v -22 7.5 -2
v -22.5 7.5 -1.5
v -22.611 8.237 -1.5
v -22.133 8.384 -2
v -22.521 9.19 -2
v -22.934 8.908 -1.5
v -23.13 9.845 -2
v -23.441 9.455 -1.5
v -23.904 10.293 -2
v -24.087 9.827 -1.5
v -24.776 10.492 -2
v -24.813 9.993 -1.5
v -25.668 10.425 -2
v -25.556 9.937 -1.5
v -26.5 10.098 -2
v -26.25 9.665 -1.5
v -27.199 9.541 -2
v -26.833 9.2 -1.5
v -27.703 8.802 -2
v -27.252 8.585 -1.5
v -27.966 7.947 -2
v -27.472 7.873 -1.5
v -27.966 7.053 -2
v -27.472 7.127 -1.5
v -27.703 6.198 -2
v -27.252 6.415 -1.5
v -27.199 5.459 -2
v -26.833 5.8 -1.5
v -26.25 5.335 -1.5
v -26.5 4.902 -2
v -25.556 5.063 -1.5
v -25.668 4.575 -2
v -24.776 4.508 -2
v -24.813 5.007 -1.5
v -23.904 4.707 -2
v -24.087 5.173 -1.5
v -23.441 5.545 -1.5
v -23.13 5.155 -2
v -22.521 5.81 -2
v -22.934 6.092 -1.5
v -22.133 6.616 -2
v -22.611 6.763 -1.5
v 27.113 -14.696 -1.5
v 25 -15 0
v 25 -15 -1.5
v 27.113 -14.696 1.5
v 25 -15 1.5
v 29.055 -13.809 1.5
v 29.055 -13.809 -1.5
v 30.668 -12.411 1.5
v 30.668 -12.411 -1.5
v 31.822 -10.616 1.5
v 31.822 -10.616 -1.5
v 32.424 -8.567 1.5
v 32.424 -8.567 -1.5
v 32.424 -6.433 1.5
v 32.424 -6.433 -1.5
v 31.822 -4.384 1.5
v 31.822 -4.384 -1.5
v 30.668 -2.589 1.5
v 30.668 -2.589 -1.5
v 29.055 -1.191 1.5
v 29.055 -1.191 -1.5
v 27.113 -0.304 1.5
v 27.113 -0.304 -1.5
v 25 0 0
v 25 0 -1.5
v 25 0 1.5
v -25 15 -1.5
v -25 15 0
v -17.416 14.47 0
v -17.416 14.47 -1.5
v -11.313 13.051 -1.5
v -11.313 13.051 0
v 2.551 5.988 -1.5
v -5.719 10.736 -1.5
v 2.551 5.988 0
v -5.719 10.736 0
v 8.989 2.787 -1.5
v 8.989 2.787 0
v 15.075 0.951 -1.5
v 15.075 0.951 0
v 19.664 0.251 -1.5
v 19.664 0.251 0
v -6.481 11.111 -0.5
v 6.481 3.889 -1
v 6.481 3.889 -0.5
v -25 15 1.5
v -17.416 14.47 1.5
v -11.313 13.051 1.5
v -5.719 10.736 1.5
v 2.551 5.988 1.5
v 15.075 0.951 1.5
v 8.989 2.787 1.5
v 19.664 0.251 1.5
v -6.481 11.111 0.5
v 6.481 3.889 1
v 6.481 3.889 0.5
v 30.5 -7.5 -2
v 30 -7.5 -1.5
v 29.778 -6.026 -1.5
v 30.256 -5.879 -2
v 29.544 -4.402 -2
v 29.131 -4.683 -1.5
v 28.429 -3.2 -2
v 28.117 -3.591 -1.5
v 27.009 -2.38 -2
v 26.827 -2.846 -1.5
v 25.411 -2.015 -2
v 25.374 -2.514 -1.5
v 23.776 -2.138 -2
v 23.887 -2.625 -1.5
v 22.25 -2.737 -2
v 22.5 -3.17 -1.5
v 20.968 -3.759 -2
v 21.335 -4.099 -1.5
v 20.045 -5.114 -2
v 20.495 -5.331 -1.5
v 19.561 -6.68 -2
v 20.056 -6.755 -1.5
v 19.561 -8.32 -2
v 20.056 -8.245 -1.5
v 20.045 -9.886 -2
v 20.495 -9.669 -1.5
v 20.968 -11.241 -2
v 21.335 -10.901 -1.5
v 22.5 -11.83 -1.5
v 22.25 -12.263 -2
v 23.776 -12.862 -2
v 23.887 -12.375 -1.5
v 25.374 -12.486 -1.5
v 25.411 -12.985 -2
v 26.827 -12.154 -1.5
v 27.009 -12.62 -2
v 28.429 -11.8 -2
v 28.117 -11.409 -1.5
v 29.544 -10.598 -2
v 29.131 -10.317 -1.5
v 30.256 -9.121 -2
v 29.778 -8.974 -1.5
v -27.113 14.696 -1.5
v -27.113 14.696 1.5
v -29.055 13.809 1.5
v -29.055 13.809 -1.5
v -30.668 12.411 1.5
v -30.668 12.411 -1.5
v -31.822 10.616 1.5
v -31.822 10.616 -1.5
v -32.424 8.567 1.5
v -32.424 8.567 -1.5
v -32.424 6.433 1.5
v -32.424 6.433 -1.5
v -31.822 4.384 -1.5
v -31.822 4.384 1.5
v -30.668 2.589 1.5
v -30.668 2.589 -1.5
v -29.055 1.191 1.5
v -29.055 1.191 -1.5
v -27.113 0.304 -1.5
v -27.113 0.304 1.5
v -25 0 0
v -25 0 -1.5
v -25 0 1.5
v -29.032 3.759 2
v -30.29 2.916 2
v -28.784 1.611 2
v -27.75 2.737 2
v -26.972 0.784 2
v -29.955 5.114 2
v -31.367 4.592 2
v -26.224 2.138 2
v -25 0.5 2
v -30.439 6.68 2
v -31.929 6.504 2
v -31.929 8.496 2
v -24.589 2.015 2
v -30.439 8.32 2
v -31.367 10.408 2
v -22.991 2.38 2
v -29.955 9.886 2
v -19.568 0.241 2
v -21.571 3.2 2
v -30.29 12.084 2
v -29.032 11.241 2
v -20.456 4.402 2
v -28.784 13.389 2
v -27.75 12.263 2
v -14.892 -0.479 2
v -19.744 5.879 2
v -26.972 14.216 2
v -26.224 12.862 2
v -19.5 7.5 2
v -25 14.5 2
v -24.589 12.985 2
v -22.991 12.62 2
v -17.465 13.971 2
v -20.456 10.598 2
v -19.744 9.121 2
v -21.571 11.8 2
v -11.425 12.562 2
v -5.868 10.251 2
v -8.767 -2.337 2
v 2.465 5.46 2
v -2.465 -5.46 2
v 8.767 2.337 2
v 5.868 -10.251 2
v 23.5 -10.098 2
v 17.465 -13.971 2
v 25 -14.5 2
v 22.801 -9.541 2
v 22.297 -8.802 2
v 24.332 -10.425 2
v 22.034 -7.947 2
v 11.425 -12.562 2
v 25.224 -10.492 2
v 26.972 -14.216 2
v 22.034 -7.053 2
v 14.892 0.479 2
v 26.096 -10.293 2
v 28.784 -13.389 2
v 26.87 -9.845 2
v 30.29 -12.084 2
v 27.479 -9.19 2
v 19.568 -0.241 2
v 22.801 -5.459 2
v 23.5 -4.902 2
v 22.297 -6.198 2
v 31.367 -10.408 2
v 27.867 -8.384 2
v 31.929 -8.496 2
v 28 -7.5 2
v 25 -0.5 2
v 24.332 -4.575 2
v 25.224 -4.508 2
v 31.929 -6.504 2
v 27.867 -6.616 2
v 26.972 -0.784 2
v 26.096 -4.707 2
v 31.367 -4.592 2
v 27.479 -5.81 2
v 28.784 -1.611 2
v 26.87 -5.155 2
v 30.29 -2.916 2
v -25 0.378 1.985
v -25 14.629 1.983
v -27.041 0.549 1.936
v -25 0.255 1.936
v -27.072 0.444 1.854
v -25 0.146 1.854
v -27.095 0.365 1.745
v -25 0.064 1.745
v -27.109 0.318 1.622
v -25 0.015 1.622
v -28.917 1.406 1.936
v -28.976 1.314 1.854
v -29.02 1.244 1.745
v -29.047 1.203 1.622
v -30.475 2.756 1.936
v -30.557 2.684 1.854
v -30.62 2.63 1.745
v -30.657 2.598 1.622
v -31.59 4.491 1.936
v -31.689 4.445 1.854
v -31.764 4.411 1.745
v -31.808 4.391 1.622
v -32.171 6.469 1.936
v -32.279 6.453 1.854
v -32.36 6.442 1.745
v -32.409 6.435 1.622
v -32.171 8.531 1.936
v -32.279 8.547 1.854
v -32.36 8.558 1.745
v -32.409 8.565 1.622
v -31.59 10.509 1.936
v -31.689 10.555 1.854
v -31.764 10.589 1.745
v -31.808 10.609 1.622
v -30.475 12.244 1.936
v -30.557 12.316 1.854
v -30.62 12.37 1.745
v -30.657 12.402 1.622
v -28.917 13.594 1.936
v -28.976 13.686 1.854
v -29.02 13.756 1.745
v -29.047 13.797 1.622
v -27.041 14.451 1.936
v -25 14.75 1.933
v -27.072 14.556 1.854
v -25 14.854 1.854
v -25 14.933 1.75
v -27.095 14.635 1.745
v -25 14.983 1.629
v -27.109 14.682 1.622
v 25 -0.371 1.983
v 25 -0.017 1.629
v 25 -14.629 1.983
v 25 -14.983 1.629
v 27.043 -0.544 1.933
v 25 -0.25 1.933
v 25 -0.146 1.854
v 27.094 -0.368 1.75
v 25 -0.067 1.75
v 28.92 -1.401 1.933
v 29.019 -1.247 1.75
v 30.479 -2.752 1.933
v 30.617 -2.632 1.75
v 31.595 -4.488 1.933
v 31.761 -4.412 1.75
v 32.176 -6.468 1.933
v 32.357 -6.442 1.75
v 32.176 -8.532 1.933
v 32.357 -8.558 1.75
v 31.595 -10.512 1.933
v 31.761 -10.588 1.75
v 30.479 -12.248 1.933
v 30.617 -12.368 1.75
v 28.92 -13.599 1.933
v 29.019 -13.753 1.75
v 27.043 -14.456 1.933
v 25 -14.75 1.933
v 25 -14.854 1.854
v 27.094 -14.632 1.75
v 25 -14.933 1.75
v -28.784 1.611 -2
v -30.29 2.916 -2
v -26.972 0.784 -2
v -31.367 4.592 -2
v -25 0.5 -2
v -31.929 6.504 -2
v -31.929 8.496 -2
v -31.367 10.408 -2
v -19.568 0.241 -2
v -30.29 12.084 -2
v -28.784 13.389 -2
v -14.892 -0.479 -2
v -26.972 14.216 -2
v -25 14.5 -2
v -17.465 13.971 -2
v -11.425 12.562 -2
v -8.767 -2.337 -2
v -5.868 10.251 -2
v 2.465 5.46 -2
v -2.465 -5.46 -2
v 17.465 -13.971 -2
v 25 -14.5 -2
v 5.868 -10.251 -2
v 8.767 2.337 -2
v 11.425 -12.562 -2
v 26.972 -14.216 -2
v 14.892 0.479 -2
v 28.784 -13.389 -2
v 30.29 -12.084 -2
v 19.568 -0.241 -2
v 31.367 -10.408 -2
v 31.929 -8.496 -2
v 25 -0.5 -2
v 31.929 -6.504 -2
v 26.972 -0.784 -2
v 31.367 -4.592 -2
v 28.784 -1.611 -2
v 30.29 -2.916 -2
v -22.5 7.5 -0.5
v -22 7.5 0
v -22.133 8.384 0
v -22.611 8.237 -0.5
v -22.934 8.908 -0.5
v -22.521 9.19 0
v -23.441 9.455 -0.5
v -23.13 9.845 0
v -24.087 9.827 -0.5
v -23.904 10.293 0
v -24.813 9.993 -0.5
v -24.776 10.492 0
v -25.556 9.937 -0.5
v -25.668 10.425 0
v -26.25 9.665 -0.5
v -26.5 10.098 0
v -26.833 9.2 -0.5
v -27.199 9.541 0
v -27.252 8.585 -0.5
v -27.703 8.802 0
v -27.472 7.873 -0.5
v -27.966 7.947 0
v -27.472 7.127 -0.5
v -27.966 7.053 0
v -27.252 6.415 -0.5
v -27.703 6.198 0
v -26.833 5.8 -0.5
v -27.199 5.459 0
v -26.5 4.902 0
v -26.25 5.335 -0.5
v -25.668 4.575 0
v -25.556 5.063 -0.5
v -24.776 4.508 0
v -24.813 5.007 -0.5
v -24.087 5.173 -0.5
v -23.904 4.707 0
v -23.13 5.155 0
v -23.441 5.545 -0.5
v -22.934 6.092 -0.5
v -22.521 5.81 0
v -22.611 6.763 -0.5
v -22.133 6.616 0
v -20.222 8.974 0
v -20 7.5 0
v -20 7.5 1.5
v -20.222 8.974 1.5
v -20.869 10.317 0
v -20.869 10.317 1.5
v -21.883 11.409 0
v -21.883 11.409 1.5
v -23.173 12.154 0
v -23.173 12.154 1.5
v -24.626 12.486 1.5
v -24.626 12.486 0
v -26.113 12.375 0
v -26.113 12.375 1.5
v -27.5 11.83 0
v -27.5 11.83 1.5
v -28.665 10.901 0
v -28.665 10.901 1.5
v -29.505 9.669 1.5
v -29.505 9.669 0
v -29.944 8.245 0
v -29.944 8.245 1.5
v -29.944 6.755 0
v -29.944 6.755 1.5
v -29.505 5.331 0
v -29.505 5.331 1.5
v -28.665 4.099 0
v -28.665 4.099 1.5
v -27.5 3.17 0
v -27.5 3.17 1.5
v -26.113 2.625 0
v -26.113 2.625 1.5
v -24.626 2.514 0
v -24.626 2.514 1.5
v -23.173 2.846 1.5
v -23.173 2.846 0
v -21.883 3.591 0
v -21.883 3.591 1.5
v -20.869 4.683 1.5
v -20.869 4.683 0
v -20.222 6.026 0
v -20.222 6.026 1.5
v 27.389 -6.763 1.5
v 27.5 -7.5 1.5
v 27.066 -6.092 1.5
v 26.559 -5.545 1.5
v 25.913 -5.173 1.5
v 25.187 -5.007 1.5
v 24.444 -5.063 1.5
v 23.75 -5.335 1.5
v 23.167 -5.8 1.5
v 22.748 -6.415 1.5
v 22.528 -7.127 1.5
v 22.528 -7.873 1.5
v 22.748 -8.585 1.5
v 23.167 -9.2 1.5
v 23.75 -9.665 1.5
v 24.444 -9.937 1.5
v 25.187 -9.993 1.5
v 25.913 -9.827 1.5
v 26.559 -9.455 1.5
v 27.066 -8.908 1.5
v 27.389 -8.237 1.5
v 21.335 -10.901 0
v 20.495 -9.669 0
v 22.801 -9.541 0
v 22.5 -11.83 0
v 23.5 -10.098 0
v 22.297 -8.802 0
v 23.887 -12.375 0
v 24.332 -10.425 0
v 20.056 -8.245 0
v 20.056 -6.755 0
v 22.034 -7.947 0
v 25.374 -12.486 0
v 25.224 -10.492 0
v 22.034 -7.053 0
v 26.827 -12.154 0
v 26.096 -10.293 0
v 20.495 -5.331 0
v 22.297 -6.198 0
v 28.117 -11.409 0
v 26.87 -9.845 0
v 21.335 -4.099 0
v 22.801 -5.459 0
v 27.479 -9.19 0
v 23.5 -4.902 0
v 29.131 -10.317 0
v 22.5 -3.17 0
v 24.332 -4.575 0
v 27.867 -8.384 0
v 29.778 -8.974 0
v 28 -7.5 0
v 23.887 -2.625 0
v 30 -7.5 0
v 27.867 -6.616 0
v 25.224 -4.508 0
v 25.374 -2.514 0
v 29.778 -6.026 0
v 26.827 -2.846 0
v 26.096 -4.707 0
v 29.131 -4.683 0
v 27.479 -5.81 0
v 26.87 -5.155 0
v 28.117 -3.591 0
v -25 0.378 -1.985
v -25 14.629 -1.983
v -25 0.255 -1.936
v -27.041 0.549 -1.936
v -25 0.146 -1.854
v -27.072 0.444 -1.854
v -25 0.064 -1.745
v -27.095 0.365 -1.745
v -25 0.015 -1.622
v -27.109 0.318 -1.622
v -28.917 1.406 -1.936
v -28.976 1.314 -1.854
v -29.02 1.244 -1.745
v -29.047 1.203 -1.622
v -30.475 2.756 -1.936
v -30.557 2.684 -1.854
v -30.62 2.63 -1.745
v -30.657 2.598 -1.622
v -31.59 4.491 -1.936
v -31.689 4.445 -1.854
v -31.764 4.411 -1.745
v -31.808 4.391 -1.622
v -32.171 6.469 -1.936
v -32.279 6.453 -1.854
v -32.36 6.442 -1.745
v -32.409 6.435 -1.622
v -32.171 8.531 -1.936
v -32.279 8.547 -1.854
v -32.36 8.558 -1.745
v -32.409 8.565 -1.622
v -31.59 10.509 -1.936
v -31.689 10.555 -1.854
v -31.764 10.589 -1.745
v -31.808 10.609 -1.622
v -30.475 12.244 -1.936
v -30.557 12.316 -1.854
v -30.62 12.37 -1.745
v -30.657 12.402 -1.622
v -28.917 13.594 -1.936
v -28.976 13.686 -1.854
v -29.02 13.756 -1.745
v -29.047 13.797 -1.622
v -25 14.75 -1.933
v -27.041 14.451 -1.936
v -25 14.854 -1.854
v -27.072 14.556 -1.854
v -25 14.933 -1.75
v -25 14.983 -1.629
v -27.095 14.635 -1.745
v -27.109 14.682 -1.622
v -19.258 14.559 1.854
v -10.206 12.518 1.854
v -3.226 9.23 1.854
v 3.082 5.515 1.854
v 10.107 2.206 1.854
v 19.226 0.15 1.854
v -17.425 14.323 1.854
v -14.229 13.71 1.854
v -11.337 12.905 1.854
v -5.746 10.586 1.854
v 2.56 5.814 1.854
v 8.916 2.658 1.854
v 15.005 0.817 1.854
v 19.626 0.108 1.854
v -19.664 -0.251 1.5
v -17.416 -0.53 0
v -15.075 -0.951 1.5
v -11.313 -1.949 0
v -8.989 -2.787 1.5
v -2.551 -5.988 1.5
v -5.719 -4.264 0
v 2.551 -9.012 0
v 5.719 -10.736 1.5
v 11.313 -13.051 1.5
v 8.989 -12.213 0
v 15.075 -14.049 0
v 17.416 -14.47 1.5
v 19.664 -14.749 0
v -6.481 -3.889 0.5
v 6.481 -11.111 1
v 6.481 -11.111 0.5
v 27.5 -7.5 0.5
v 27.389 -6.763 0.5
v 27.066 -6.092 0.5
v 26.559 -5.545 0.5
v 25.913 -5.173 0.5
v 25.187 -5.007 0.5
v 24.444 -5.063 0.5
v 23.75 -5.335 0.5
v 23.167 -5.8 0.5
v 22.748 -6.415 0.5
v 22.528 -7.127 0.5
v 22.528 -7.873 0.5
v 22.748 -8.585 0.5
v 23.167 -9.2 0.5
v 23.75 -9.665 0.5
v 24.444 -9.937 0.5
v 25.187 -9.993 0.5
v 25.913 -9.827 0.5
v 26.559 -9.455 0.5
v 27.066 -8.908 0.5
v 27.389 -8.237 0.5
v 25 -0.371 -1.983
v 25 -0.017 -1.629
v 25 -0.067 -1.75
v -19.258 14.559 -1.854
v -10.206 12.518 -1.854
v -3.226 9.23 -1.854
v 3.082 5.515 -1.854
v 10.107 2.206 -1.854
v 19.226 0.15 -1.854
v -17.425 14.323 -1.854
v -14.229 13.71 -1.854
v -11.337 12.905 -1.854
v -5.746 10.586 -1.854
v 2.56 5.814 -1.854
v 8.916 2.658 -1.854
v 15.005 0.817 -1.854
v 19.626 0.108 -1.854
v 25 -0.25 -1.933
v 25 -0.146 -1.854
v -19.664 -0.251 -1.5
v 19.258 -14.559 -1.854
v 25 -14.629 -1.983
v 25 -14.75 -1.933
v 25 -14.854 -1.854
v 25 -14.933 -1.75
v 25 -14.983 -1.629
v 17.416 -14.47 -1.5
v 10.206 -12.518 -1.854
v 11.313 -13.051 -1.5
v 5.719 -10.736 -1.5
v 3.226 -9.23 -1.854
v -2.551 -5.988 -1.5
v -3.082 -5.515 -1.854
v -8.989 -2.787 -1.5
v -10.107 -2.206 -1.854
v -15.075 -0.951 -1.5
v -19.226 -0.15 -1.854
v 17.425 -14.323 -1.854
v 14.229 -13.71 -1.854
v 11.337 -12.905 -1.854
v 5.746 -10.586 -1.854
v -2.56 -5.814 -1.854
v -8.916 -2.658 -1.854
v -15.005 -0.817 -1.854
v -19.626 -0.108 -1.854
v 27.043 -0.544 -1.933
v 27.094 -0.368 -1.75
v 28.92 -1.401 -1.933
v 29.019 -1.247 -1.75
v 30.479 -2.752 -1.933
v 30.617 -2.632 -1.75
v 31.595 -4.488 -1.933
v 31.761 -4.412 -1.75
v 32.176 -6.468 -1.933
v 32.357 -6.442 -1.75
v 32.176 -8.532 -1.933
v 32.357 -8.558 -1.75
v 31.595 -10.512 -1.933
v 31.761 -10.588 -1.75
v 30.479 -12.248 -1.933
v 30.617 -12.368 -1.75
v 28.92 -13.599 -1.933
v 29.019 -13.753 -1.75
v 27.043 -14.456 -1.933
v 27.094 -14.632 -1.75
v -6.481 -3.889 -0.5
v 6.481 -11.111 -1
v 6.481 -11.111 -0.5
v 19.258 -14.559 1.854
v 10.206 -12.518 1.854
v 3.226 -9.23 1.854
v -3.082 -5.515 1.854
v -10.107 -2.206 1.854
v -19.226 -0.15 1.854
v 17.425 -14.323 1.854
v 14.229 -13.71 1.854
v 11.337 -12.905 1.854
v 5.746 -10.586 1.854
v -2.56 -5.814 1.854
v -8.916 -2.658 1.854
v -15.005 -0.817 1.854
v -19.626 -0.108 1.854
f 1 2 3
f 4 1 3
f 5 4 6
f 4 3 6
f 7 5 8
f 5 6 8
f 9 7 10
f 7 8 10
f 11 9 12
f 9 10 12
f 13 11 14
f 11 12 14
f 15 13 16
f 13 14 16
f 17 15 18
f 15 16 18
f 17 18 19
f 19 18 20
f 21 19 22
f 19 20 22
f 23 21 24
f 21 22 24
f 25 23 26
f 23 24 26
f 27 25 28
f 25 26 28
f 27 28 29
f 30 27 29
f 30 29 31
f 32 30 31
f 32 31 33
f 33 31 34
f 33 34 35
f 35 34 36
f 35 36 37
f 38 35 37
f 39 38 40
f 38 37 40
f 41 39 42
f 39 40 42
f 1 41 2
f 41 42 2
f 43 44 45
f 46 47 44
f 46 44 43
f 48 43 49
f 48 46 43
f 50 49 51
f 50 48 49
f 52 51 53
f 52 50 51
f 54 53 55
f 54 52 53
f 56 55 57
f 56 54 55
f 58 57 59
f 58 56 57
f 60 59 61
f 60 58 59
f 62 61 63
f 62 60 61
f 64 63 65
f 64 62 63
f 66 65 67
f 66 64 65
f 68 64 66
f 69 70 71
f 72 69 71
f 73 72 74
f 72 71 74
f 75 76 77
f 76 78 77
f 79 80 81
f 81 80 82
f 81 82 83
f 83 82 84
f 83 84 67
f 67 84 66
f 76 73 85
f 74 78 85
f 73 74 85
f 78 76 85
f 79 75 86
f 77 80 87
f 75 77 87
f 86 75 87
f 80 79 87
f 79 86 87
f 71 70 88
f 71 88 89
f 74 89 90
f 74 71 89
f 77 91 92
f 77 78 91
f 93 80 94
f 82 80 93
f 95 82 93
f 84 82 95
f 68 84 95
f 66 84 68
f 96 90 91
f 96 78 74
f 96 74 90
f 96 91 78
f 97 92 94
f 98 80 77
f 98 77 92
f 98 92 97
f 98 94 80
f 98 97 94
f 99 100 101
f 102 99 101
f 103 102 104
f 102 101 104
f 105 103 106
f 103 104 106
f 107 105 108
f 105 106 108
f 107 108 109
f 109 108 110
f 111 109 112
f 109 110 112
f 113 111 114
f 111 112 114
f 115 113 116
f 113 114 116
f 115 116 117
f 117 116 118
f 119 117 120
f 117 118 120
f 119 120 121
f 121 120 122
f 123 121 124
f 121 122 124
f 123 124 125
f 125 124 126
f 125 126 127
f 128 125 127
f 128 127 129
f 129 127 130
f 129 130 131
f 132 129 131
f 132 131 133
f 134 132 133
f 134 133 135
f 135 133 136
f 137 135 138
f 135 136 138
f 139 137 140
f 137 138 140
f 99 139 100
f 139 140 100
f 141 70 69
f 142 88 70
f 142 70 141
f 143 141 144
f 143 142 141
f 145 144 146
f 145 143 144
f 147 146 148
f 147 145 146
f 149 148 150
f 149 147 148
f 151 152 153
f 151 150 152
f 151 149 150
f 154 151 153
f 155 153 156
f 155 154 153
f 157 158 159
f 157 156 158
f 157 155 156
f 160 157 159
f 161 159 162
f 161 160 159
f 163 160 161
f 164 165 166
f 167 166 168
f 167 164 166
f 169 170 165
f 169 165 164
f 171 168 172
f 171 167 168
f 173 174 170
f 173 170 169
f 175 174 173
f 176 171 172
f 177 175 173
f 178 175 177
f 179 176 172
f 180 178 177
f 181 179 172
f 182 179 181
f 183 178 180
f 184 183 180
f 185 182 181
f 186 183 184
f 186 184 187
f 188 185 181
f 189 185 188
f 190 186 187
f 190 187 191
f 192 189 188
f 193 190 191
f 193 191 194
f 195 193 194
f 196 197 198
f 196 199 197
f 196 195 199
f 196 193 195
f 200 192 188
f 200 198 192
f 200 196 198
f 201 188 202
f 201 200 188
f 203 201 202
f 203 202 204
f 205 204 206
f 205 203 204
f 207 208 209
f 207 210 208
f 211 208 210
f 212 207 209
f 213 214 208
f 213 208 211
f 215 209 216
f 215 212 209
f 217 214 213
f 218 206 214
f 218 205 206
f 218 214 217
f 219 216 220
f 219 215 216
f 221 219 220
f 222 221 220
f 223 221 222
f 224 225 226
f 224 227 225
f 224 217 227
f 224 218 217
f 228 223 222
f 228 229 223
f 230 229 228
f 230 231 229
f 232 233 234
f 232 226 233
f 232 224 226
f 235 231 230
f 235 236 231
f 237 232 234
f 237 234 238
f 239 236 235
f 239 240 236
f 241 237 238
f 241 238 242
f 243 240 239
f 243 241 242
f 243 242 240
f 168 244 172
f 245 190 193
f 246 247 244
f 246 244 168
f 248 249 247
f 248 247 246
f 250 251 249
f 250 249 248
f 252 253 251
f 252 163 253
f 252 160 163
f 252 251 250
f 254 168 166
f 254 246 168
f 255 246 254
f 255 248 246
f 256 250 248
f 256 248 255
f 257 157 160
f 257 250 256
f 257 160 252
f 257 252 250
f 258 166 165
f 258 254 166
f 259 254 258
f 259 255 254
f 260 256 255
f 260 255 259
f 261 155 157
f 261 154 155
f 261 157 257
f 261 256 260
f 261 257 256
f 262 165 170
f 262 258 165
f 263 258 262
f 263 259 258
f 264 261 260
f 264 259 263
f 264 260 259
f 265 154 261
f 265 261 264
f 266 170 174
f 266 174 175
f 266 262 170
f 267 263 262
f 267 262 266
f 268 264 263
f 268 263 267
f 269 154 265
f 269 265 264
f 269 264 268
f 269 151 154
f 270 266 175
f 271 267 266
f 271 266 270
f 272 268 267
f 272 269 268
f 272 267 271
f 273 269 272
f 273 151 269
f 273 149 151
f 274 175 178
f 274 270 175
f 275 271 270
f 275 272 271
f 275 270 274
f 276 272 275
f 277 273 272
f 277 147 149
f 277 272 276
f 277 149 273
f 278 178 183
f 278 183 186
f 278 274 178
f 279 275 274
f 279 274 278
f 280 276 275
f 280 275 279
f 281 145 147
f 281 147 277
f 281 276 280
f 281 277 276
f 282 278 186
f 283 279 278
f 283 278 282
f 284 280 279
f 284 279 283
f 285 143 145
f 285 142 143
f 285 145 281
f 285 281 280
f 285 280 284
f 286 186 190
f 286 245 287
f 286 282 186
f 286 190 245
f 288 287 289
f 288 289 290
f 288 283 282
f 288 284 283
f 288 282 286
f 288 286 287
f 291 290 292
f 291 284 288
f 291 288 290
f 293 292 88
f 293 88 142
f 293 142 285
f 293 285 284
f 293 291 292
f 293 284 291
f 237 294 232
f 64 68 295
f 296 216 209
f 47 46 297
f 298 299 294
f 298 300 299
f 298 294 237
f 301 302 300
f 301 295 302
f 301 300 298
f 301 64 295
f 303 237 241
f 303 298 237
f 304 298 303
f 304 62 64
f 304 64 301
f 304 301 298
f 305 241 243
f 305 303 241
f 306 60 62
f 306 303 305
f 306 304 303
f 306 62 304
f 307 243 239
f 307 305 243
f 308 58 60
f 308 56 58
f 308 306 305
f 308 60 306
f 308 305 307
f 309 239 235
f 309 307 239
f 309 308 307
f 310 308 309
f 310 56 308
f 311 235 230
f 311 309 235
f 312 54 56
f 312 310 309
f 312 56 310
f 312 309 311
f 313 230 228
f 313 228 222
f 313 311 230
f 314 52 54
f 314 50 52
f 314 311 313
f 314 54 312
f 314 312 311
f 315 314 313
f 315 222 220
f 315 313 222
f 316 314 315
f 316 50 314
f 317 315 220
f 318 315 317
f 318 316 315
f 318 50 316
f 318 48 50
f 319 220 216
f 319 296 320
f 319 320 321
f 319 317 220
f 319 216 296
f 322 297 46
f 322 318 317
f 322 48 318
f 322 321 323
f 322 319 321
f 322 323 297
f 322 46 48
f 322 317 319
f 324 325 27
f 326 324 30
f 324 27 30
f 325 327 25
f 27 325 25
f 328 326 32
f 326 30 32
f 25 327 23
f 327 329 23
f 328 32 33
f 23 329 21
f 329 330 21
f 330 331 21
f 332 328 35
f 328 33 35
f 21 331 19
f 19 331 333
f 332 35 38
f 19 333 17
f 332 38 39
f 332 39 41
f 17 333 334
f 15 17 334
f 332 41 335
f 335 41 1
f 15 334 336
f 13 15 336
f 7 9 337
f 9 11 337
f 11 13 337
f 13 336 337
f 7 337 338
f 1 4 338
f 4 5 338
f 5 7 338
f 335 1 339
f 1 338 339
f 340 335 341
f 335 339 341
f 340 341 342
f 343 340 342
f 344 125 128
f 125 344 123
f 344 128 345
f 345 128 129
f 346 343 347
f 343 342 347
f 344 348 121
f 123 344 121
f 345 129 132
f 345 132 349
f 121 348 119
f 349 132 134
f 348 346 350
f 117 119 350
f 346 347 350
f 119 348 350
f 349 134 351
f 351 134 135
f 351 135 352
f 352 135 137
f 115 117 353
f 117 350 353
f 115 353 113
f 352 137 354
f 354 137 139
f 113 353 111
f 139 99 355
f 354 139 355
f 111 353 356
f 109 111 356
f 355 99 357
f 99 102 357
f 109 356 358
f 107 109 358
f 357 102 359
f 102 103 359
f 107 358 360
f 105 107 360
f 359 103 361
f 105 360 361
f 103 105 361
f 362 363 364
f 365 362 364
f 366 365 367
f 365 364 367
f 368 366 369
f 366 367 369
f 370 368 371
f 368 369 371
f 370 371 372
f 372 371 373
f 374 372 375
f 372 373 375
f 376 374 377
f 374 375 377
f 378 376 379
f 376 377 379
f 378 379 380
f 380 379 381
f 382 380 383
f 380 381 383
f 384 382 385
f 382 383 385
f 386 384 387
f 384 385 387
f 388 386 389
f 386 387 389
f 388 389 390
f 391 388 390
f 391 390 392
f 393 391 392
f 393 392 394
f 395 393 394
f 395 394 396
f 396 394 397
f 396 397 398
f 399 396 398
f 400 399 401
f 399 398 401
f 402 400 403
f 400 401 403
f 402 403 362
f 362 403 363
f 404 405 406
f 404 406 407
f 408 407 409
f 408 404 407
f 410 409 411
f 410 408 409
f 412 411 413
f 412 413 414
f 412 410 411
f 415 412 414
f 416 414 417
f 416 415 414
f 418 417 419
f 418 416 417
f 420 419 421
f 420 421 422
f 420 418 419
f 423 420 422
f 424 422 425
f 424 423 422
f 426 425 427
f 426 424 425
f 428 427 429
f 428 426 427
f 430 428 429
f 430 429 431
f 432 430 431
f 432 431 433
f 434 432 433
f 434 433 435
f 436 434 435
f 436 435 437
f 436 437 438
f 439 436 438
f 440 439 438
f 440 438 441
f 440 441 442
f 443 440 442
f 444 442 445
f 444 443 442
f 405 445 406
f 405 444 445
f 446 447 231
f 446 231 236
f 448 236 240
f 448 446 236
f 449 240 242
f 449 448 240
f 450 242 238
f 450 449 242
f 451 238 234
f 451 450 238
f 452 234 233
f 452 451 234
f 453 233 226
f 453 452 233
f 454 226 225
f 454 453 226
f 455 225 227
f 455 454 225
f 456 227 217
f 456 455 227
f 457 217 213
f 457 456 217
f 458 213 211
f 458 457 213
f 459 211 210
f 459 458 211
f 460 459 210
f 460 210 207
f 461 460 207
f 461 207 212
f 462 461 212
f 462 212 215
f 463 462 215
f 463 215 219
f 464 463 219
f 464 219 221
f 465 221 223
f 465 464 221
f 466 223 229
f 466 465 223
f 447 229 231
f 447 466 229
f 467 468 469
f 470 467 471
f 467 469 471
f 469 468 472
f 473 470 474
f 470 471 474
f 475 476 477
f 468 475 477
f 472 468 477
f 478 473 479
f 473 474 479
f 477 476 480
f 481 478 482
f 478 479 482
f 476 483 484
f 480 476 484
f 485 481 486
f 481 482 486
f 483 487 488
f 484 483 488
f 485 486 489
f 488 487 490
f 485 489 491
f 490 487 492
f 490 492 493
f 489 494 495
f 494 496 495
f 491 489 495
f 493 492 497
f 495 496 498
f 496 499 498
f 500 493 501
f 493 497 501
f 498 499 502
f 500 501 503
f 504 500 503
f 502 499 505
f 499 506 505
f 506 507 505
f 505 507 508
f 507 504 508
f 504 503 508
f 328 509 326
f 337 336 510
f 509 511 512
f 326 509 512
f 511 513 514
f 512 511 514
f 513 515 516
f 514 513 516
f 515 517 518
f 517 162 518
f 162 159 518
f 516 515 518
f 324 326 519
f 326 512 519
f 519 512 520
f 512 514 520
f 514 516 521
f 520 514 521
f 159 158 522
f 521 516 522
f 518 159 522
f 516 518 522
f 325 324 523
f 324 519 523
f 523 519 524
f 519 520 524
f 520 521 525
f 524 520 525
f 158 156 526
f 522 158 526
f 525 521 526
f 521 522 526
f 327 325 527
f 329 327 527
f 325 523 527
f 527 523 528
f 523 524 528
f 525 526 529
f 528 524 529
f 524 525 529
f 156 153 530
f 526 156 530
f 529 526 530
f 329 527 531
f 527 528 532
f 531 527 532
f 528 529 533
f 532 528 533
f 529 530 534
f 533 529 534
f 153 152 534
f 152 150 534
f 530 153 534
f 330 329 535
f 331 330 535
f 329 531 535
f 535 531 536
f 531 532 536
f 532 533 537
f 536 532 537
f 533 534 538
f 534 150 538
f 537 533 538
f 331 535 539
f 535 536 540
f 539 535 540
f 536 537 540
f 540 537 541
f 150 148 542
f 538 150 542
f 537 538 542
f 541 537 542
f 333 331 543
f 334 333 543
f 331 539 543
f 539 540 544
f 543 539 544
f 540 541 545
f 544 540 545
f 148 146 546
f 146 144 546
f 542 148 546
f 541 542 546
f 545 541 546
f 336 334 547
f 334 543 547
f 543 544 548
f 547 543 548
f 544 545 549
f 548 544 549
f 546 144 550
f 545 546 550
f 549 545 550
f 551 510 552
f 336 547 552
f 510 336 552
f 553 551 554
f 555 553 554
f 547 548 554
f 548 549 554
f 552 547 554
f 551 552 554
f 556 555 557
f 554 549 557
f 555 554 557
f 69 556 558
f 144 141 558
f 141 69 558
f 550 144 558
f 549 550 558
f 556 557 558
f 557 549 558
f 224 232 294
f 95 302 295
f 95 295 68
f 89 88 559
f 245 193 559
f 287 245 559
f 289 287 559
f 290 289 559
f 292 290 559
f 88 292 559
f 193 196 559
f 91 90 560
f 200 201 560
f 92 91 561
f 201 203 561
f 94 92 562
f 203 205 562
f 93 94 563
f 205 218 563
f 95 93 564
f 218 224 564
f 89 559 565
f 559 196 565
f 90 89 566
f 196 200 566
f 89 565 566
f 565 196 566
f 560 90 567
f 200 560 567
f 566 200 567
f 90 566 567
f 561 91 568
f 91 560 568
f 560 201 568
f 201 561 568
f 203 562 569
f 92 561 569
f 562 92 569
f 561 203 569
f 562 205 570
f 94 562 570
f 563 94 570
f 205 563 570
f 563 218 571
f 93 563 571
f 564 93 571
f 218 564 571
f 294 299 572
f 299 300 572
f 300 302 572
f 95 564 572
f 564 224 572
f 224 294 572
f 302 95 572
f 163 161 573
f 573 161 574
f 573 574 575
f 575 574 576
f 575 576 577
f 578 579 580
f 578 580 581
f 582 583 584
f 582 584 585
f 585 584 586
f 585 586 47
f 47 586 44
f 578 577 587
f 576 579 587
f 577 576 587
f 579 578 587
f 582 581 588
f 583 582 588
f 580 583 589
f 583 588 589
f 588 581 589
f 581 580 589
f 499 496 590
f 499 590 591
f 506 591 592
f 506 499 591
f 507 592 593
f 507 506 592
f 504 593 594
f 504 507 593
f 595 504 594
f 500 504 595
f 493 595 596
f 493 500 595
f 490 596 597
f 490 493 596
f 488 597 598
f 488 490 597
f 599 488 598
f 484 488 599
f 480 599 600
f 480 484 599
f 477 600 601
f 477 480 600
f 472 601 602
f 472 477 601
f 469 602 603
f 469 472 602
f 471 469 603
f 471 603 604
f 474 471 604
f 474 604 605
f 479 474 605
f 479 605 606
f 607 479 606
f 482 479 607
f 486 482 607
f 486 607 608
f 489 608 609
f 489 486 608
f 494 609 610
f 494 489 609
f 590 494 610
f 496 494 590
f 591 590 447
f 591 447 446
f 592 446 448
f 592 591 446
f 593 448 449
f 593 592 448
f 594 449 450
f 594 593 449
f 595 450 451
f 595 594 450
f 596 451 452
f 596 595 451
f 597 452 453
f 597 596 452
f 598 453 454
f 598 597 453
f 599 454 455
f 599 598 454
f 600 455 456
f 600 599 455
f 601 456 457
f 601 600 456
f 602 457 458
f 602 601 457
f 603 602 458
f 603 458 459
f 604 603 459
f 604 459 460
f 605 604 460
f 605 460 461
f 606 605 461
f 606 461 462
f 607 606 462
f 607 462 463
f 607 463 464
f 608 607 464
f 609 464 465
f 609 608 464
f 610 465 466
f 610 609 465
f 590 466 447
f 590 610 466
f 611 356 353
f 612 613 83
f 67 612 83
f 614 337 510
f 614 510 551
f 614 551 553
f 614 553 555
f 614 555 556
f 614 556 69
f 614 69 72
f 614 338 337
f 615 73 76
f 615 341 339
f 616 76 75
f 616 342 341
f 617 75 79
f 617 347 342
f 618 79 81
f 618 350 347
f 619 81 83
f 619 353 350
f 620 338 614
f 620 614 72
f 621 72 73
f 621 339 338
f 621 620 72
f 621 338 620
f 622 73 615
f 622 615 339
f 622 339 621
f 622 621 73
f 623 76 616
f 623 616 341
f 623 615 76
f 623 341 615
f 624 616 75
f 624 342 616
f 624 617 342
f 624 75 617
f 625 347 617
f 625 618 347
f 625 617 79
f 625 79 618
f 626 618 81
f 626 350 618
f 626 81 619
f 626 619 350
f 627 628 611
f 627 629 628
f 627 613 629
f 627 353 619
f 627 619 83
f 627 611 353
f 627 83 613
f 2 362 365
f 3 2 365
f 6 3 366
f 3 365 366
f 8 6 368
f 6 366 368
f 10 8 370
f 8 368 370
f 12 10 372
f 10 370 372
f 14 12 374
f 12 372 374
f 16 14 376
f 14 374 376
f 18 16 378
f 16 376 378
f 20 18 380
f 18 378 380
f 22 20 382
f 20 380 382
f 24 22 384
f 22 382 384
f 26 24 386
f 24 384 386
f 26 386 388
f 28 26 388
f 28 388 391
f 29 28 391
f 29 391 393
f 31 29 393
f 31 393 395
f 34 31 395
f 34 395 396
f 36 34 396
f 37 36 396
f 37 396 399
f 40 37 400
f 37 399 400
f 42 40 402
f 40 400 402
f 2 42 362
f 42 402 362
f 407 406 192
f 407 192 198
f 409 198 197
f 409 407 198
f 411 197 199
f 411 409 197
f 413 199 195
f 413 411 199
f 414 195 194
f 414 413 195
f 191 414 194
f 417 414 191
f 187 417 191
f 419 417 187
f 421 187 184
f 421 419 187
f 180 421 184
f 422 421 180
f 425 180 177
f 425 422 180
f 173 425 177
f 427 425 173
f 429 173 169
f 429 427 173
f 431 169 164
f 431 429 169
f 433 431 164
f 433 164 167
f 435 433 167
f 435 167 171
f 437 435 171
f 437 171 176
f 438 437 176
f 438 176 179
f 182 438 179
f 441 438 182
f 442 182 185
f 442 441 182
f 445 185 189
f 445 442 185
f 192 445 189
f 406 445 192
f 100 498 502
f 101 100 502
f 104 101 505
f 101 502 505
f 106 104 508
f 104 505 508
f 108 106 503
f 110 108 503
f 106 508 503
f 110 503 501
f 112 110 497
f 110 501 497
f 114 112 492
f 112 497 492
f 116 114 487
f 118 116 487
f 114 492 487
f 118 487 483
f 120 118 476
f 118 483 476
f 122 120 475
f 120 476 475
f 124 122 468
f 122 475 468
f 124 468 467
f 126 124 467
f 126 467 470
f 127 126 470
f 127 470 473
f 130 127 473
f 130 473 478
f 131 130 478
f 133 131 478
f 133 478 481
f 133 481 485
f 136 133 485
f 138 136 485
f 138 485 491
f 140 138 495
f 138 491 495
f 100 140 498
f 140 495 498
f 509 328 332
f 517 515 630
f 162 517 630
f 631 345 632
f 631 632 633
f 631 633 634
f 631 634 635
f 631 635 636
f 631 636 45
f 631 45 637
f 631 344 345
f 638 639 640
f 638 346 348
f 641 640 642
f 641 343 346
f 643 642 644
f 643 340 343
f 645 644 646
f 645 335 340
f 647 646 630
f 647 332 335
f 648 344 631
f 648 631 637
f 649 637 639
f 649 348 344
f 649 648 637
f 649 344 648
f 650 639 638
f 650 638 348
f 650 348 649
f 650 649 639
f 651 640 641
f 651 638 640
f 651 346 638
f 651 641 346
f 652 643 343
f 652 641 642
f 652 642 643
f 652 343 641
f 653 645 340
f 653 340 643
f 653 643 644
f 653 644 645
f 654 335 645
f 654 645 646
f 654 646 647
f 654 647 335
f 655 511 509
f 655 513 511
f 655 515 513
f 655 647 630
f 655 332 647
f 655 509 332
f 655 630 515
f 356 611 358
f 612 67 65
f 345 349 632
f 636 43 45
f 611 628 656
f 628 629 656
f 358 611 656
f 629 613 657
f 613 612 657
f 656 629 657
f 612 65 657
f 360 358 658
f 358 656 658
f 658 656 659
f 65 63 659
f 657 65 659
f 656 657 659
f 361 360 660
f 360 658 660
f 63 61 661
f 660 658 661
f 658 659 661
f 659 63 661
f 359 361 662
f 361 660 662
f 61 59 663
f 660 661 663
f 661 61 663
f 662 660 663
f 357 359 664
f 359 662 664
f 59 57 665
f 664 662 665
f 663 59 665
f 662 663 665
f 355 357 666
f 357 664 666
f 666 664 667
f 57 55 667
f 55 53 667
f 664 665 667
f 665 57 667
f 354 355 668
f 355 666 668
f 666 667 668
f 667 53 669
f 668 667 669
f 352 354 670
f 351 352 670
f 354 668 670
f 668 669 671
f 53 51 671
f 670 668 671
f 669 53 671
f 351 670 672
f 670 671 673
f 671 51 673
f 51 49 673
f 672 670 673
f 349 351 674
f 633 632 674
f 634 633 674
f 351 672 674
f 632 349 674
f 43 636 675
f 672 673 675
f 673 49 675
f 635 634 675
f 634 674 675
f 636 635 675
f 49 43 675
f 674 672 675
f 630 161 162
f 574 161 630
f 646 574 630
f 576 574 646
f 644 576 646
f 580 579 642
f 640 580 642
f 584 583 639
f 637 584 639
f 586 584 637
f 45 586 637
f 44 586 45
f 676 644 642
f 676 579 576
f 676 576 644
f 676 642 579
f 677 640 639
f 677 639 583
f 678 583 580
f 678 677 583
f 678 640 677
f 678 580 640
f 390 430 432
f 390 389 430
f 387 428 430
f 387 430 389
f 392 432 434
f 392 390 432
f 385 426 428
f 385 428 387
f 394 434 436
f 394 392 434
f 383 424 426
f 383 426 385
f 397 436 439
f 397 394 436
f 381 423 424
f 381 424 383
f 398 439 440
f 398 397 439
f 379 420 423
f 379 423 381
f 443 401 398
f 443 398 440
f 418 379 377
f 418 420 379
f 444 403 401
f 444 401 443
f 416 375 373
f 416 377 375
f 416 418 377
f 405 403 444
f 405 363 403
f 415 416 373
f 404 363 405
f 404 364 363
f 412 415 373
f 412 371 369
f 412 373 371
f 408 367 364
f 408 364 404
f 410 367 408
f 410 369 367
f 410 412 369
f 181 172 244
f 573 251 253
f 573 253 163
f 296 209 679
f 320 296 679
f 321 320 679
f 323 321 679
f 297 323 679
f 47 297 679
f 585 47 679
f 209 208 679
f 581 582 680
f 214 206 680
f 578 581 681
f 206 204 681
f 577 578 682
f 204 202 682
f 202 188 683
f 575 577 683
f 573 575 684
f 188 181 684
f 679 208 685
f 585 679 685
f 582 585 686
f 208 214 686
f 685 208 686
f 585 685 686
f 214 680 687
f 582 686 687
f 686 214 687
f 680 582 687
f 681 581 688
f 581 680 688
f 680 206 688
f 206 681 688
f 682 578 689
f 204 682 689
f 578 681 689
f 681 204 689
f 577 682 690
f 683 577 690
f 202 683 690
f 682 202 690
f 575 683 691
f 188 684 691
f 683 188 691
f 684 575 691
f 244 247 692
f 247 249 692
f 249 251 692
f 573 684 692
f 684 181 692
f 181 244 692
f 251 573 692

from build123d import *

# Parameters (mm, degrees)
F0_R     = 5
F0_R_2   = 2.5
F1_DEPTH = 2
F2_DEPTH = 2
F3_SIZE  = 0.5
F4_R     = 0.5


with BuildPart() as f1:
    # F0 (on Top) → F1 (new body)
    with BuildSketch(Plane.XY):
        with BuildLine():
            ThreePointArc((-25, 15), (-19.6966991411, 12.8033008589), (-17.5, 7.5))
            ThreePointArc((-17.5, 7.5), (-19.6966991411, 2.1966991411), (-25, 0))
            add(Edge.make_bspline(
                [(-25, 0), (0, 0), (0, -15), (25, -15)],
                knots=[0, 0, 0, 0, 52.2015325446, 52.2015325446, 52.2015325446, 52.2015325446], degree=3))
            ThreePointArc((25, -15), (17.5, -7.5), (25, 0))
            add(Edge.make_bspline(
                [(-25, 15), (0, 15), (0, 0), (25, 0)],
                knots=[0, 0, 0, 0, 52.2015325446, 52.2015325446, 52.2015325446, 52.2015325446], degree=3))
        make_face()
        with BuildLine():
            ThreePointArc((-25, 0), (-19.6966991411, 2.1966991411), (-17.5, 7.5))
            ThreePointArc((-17.5, 7.5), (-19.6966991411, 12.8033008589), (-25, 15))
            ThreePointArc((-25, 15), (-32.5, 7.5), (-25, 0))
        make_face()
        with Locations((-25, 7.5)):
            Circle(F0_R, mode=Mode.SUBTRACT)
        with BuildLine():
            ThreePointArc((32.5, -7.5), (30.3033008589, -2.1966991411), (25, 0))
            ThreePointArc((25, 0), (17.5, -7.5), (25, -15))
            ThreePointArc((25, -15), (30.3033008589, -12.8033008589), (32.5, -7.5))
        make_face()
        with Locations((25, -7.5)):
            Circle(F0_R, mode=Mode.SUBTRACT)
        with Locations((25, -7.5)):
            Circle(F0_R)
        with Locations((25, -7.5)):
            Circle(F0_R_2, mode=Mode.SUBTRACT)
    extrude(amount=F1_DEPTH)

    # F0 (on Top) → F2 (join)
    with BuildSketch(Plane.XY):
        with BuildLine():
            ThreePointArc((-25, 0), (-19.6966991411, 2.1966991411), (-17.5, 7.5))
            ThreePointArc((-17.5, 7.5), (-19.6966991411, 12.8033008589), (-25, 15))
            ThreePointArc((-25, 15), (-32.5, 7.5), (-25, 0))
        make_face()
        with Locations((-25, 7.5)):
            Circle(F0_R, mode=Mode.SUBTRACT)
        with BuildLine():
            ThreePointArc((-25, 15), (-19.6966991411, 12.8033008589), (-17.5, 7.5))
            ThreePointArc((-17.5, 7.5), (-19.6966991411, 2.1966991411), (-25, 0))
            add(Edge.make_bspline(
                [(-25, 0), (0, 0), (0, -15), (25, -15)],
                knots=[0, 0, 0, 0, 52.2015325446, 52.2015325446, 52.2015325446, 52.2015325446], degree=3))
            ThreePointArc((25, -15), (17.5, -7.5), (25, 0))
            add(Edge.make_bspline(
                [(-25, 15), (0, 15), (0, 0), (25, 0)],
                knots=[0, 0, 0, 0, 52.2015325446, 52.2015325446, 52.2015325446, 52.2015325446], degree=3))
        make_face()
        with BuildLine():
            ThreePointArc((32.5, -7.5), (30.3033008589, -2.1966991411), (25, 0))
            ThreePointArc((25, 0), (17.5, -7.5), (25, -15))
            ThreePointArc((25, -15), (30.3033008589, -12.8033008589), (32.5, -7.5))
        make_face()
        with Locations((25, -7.5)):
            Circle(F0_R, mode=Mode.SUBTRACT)
        with Locations((-25, 7.5)):
            Circle(F0_R)
        with Locations((-25, 7.5)):
            Circle(F0_R_2, mode=Mode.SUBTRACT)
    extrude(amount=-F2_DEPTH)

    # F3
    f3_edges = [f1.edges().sort_by_distance(p)[0] for p in [
        (-30, 7.5, 2),
        (22.5, -7.5, 2),
        (-27.5, 7.5, 0),
        (-27.5, 7.5, -2),
        (20, -7.5, -2),
        (22.5, -7.5, 0),
    ]]
    chamfer(f3_edges, length=F3_SIZE)

    # F4
    f4_edges = [f1.edges().sort_by_distance(p)[0] for p in [
        (-1.5e-05, 7.500009, -2),
        (-1.5e-05, 7.500009, 2),
    ]]
    fillet(f4_edges, radius=F4_R)


solid = f1.part
